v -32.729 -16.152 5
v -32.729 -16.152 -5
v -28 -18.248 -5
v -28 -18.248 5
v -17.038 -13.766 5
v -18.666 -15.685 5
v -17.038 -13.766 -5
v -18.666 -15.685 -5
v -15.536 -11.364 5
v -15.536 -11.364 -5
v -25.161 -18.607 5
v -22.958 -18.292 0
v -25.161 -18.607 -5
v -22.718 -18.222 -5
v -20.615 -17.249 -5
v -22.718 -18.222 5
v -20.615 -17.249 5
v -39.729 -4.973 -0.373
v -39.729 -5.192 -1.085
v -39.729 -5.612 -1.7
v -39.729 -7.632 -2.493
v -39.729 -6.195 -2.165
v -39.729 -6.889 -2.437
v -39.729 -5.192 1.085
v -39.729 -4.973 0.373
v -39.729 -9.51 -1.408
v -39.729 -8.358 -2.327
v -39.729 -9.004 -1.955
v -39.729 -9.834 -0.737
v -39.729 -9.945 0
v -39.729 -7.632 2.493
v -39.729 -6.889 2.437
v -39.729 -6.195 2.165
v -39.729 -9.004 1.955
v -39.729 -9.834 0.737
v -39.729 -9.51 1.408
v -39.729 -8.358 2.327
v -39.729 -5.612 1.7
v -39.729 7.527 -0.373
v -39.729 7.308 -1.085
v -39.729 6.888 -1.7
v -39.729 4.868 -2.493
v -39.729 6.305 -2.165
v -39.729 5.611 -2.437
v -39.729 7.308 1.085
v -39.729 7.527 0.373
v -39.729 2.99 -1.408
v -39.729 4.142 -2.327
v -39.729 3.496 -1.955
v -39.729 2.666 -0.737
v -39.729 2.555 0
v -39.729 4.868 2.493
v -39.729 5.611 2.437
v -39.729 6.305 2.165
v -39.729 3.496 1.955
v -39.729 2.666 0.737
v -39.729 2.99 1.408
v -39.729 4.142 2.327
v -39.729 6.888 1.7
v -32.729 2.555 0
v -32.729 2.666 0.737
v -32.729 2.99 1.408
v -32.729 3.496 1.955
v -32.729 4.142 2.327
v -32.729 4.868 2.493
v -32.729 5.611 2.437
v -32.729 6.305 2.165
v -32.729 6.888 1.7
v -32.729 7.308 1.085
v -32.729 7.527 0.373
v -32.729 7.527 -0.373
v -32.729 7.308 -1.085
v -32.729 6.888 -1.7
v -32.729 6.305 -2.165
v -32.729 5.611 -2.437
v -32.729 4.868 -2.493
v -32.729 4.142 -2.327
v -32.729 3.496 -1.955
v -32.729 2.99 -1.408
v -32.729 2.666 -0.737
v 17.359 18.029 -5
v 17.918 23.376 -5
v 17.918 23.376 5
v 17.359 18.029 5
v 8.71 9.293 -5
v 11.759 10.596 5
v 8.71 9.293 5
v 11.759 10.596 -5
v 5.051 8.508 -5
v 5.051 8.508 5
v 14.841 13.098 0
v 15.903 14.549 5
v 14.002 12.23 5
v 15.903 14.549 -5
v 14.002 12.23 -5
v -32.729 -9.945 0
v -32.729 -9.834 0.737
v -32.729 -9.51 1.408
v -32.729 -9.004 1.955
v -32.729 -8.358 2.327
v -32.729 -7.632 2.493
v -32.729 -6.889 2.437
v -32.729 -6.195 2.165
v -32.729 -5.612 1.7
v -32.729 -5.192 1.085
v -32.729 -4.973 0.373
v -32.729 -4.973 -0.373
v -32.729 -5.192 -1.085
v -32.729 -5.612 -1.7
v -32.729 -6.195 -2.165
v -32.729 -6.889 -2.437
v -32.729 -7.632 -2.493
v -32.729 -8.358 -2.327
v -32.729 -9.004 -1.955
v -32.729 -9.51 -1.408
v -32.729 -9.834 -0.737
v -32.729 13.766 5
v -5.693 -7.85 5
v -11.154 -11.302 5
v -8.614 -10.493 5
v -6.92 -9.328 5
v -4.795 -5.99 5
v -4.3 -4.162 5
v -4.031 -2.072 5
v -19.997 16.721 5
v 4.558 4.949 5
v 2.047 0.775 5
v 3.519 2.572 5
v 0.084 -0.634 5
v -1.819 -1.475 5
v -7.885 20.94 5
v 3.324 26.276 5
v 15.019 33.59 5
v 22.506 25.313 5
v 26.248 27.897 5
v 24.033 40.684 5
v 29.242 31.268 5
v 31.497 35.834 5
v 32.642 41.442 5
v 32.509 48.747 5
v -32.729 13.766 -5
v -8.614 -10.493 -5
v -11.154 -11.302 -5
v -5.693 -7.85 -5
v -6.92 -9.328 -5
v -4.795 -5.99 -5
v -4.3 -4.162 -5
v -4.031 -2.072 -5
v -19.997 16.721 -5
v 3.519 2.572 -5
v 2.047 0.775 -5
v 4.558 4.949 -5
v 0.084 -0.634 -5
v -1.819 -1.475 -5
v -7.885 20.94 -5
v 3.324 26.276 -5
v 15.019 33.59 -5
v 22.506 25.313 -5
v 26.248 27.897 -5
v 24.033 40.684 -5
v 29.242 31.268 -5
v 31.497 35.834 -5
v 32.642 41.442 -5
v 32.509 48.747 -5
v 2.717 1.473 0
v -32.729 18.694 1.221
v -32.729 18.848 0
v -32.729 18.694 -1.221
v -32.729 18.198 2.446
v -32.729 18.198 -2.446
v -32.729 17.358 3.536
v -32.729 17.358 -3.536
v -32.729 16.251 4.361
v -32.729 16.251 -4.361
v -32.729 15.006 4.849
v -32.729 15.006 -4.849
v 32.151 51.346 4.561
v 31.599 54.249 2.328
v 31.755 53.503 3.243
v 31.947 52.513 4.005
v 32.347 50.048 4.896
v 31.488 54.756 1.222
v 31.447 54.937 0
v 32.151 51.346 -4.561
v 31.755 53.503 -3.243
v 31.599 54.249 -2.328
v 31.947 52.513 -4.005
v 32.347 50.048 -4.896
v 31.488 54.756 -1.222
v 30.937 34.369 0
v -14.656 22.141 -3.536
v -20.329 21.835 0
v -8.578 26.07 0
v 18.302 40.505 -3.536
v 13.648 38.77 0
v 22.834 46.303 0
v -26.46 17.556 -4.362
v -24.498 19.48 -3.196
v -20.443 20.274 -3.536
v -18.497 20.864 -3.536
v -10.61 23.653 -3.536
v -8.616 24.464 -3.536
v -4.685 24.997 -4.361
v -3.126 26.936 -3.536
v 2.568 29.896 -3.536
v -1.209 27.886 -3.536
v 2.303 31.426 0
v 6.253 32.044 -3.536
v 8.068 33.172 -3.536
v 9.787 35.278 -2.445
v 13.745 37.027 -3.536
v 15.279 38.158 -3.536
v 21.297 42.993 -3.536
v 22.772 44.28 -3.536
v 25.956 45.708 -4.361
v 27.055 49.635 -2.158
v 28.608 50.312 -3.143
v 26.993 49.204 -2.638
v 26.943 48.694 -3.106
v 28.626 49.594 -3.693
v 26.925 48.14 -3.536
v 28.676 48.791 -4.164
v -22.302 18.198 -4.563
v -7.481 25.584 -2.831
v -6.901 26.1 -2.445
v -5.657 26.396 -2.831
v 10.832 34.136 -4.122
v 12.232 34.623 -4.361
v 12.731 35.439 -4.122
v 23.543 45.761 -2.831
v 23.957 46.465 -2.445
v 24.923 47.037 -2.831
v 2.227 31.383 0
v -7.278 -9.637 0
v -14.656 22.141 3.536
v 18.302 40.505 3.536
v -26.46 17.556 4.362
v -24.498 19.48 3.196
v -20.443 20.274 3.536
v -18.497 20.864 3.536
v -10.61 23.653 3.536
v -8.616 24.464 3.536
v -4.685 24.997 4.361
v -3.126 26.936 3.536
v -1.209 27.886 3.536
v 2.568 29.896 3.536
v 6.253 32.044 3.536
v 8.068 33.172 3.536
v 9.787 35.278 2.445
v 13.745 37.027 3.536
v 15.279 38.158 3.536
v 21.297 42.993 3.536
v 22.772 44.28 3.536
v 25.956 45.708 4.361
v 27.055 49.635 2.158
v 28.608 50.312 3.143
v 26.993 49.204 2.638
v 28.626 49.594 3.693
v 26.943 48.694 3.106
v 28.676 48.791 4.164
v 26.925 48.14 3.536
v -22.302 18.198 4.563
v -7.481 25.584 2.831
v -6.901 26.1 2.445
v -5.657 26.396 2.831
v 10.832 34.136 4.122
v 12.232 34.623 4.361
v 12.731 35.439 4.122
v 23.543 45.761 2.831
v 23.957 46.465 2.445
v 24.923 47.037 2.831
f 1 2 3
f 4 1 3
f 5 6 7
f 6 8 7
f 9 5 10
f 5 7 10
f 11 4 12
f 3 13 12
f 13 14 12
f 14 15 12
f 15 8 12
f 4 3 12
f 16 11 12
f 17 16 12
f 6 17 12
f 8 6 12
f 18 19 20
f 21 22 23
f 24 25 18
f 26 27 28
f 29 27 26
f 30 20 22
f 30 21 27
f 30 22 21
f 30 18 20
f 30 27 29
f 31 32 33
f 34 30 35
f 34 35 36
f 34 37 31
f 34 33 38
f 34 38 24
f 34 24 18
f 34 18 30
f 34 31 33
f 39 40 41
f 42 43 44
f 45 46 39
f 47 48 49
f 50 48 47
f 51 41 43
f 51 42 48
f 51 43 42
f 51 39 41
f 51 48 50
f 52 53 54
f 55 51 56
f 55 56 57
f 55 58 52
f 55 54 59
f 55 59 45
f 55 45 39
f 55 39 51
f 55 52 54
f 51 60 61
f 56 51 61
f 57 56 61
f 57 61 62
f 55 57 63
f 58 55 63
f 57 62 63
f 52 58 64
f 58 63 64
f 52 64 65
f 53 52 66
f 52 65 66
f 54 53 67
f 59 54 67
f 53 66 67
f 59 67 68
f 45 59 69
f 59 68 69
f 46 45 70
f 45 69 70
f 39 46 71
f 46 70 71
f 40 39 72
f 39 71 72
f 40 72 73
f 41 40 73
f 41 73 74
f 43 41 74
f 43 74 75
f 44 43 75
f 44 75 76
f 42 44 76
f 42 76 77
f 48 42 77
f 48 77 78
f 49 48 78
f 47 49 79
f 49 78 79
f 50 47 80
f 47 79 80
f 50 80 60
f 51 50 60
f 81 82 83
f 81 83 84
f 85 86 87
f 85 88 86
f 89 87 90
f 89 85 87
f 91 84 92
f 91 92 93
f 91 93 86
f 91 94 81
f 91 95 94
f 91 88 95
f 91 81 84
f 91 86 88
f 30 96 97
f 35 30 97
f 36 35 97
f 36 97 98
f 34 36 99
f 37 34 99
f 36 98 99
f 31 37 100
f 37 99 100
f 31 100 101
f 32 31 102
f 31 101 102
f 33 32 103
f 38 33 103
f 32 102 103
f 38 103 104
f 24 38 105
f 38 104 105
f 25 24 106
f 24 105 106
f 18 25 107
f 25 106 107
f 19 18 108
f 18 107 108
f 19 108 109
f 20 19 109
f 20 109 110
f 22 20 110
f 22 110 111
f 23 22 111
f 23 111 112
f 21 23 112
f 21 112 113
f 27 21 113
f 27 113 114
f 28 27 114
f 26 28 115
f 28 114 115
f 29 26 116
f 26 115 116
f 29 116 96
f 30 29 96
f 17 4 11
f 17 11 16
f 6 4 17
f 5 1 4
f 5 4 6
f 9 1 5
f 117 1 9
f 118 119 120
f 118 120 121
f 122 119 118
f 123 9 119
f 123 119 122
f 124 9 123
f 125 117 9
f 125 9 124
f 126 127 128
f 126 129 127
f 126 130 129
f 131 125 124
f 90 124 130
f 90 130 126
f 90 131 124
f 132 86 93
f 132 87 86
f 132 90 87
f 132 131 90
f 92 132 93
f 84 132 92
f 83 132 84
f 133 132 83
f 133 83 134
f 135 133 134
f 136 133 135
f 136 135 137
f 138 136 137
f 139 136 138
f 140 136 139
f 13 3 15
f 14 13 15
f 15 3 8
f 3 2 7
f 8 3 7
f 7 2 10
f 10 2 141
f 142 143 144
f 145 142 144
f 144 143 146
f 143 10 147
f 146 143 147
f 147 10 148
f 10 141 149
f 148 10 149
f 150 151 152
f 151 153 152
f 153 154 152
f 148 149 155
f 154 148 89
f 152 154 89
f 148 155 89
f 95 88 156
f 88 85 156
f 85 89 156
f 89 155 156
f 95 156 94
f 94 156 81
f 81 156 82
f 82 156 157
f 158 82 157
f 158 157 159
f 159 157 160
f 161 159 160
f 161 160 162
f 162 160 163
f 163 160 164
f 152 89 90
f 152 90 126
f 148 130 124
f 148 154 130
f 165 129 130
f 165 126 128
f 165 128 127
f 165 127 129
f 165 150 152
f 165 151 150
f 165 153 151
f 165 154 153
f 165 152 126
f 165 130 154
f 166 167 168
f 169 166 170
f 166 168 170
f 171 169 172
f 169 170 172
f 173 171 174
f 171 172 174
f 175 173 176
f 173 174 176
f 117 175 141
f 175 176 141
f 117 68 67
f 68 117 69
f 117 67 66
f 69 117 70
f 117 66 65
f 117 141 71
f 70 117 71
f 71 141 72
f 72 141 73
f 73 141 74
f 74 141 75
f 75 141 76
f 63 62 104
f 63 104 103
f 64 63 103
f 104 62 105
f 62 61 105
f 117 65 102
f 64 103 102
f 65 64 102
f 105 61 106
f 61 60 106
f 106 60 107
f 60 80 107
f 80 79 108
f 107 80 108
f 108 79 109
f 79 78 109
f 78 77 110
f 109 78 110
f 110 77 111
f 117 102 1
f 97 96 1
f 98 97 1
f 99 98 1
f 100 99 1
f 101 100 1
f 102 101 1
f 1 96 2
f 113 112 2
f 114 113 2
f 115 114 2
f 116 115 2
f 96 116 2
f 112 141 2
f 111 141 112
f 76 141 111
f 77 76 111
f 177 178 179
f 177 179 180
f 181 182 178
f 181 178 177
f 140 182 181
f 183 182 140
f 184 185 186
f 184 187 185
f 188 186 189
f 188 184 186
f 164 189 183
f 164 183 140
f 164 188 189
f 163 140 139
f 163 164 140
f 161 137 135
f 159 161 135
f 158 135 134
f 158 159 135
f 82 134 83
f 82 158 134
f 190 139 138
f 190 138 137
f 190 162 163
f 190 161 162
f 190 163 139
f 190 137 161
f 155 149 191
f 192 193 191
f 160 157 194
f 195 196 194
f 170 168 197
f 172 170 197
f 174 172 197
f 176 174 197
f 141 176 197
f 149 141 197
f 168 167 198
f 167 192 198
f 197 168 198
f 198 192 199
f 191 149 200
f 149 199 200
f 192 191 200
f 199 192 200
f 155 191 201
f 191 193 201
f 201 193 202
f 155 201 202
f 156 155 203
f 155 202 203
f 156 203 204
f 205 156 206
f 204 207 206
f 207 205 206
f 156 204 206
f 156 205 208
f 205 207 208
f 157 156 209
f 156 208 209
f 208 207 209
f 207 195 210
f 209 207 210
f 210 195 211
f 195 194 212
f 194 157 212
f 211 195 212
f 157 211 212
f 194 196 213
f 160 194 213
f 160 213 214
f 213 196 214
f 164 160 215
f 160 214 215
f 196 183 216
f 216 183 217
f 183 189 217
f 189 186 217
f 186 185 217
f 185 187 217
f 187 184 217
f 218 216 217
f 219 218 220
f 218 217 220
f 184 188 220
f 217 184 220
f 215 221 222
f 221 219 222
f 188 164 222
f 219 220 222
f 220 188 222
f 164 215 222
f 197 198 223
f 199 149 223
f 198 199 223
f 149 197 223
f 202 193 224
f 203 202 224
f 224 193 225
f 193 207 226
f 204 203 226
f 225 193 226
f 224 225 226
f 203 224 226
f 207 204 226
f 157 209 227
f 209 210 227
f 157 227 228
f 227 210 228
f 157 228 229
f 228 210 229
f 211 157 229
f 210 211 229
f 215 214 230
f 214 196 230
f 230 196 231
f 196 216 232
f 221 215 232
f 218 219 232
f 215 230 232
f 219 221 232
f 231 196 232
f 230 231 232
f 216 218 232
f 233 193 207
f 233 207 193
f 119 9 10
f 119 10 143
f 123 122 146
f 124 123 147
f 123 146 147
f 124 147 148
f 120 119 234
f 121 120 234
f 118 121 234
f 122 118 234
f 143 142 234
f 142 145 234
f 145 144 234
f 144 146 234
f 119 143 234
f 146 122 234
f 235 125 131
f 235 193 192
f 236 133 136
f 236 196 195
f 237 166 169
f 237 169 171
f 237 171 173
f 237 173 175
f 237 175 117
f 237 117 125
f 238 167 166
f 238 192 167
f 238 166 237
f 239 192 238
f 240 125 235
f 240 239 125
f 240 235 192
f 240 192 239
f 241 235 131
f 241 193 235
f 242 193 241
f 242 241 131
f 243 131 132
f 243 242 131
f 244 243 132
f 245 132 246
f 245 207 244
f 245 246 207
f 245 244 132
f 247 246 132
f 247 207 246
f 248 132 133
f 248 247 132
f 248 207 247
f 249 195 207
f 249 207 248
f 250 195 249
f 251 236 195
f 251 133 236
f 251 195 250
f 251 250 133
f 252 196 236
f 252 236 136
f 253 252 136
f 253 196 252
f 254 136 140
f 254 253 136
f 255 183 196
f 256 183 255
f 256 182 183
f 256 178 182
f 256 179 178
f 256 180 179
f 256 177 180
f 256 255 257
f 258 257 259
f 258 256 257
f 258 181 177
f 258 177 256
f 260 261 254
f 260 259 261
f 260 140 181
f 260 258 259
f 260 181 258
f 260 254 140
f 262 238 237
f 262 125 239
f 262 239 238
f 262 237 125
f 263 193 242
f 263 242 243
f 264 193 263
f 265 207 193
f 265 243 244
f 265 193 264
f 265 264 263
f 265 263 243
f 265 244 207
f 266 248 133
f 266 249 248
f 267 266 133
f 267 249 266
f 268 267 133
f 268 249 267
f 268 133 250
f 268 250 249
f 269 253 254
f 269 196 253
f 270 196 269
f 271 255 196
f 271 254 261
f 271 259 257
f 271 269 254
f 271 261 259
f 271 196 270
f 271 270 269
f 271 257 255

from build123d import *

# Parameters (mm, degrees)
EXTRUDE_1_DEPTH      = 5
EXTRUDE_1_DEPTH_BACK = 5
FILLET_3_R           = 5
SKETCH_2_R           = 2.5
EXTRUDE_2_DEPTH      = 7


with BuildPart() as part:
    # 草圖1 → 填料-伸長1 (new, two sides: drawn at the far end of the back side and taken through both)
    with BuildSketch(Plane.XY.offset(-EXTRUDE_1_DEPTH_BACK)):
        with BuildLine():
            Line((-32.728711913, 18.847882673), (-32.728711913, -16.152117327))
            add(Edge.make_bspline(
                [(-32.728711913, -16.152117327), (-21.783034561, -22.826167416), (-15.535655433, -11.364162116)],
                knots=[0, 0, 0, 1, 1, 1], degree=2))
            add(Edge.make_bspline(
                [(-15.535655433, -11.364162116), (-4.773052761, -12.557057066), (-4.030638728, -2.071536696)],
                knots=[0, 0, 0, 1, 1, 1], degree=2))
            add(Edge.make_bspline(
                [(5.051083958, 8.507759935), (4.922923736, -0.27289527), (-4.030638728, -2.071536696)],
                knots=[0, 0, 0, 1, 1, 1], degree=2))
            add(Edge.make_bspline(
                [(17.917796077, 23.375960607), (18.197143612, 10.254572471), (5.051083958, 8.507759935)],
                knots=[0, 0, 0, 1, 1, 1], degree=2))
            add(Edge.make_bspline(
                [(31.447225321, 54.936813216), (37.191964726, 29.582174335), (17.917796077, 23.375960607)],
                knots=[0, 0, 0, 1, 1, 1], degree=2))
            add(Edge.make_bspline(
                [(-32.728711913, 18.847882673), (5.094383594, 25.874030711), (31.447225321, 54.936813216)],
                knots=[0, 0, 0, 1, 1, 1], degree=2))
        make_face()
    extrude(amount=EXTRUDE_1_DEPTH + EXTRUDE_1_DEPTH_BACK)

    # 圓角3
    fillet_3_edges = [part.edges().sort_by_distance(p)[0] for p in [
        (2.226820149, 31.383189328, -5),
        (2.226820149, 31.383189328, 5),
    ]]
    fillet(fillet_3_edges, radius=FILLET_3_R - 0.0001)  # a hair under: the kernel refuses the full size

    # 草圖2 → 填料-伸長2 (add)
    with BuildSketch(Plane.ZY.offset(32.728711913)):
        with Locations(Location((0, 5.055113449, 0), (0, 0, 270))):
            Circle(SKETCH_2_R)
        with Locations(Location((0, -7.444886551, 0), (0, 0, 270))):
            Circle(SKETCH_2_R)
    extrude(amount=EXTRUDE_2_DEPTH)


solid = part.part
